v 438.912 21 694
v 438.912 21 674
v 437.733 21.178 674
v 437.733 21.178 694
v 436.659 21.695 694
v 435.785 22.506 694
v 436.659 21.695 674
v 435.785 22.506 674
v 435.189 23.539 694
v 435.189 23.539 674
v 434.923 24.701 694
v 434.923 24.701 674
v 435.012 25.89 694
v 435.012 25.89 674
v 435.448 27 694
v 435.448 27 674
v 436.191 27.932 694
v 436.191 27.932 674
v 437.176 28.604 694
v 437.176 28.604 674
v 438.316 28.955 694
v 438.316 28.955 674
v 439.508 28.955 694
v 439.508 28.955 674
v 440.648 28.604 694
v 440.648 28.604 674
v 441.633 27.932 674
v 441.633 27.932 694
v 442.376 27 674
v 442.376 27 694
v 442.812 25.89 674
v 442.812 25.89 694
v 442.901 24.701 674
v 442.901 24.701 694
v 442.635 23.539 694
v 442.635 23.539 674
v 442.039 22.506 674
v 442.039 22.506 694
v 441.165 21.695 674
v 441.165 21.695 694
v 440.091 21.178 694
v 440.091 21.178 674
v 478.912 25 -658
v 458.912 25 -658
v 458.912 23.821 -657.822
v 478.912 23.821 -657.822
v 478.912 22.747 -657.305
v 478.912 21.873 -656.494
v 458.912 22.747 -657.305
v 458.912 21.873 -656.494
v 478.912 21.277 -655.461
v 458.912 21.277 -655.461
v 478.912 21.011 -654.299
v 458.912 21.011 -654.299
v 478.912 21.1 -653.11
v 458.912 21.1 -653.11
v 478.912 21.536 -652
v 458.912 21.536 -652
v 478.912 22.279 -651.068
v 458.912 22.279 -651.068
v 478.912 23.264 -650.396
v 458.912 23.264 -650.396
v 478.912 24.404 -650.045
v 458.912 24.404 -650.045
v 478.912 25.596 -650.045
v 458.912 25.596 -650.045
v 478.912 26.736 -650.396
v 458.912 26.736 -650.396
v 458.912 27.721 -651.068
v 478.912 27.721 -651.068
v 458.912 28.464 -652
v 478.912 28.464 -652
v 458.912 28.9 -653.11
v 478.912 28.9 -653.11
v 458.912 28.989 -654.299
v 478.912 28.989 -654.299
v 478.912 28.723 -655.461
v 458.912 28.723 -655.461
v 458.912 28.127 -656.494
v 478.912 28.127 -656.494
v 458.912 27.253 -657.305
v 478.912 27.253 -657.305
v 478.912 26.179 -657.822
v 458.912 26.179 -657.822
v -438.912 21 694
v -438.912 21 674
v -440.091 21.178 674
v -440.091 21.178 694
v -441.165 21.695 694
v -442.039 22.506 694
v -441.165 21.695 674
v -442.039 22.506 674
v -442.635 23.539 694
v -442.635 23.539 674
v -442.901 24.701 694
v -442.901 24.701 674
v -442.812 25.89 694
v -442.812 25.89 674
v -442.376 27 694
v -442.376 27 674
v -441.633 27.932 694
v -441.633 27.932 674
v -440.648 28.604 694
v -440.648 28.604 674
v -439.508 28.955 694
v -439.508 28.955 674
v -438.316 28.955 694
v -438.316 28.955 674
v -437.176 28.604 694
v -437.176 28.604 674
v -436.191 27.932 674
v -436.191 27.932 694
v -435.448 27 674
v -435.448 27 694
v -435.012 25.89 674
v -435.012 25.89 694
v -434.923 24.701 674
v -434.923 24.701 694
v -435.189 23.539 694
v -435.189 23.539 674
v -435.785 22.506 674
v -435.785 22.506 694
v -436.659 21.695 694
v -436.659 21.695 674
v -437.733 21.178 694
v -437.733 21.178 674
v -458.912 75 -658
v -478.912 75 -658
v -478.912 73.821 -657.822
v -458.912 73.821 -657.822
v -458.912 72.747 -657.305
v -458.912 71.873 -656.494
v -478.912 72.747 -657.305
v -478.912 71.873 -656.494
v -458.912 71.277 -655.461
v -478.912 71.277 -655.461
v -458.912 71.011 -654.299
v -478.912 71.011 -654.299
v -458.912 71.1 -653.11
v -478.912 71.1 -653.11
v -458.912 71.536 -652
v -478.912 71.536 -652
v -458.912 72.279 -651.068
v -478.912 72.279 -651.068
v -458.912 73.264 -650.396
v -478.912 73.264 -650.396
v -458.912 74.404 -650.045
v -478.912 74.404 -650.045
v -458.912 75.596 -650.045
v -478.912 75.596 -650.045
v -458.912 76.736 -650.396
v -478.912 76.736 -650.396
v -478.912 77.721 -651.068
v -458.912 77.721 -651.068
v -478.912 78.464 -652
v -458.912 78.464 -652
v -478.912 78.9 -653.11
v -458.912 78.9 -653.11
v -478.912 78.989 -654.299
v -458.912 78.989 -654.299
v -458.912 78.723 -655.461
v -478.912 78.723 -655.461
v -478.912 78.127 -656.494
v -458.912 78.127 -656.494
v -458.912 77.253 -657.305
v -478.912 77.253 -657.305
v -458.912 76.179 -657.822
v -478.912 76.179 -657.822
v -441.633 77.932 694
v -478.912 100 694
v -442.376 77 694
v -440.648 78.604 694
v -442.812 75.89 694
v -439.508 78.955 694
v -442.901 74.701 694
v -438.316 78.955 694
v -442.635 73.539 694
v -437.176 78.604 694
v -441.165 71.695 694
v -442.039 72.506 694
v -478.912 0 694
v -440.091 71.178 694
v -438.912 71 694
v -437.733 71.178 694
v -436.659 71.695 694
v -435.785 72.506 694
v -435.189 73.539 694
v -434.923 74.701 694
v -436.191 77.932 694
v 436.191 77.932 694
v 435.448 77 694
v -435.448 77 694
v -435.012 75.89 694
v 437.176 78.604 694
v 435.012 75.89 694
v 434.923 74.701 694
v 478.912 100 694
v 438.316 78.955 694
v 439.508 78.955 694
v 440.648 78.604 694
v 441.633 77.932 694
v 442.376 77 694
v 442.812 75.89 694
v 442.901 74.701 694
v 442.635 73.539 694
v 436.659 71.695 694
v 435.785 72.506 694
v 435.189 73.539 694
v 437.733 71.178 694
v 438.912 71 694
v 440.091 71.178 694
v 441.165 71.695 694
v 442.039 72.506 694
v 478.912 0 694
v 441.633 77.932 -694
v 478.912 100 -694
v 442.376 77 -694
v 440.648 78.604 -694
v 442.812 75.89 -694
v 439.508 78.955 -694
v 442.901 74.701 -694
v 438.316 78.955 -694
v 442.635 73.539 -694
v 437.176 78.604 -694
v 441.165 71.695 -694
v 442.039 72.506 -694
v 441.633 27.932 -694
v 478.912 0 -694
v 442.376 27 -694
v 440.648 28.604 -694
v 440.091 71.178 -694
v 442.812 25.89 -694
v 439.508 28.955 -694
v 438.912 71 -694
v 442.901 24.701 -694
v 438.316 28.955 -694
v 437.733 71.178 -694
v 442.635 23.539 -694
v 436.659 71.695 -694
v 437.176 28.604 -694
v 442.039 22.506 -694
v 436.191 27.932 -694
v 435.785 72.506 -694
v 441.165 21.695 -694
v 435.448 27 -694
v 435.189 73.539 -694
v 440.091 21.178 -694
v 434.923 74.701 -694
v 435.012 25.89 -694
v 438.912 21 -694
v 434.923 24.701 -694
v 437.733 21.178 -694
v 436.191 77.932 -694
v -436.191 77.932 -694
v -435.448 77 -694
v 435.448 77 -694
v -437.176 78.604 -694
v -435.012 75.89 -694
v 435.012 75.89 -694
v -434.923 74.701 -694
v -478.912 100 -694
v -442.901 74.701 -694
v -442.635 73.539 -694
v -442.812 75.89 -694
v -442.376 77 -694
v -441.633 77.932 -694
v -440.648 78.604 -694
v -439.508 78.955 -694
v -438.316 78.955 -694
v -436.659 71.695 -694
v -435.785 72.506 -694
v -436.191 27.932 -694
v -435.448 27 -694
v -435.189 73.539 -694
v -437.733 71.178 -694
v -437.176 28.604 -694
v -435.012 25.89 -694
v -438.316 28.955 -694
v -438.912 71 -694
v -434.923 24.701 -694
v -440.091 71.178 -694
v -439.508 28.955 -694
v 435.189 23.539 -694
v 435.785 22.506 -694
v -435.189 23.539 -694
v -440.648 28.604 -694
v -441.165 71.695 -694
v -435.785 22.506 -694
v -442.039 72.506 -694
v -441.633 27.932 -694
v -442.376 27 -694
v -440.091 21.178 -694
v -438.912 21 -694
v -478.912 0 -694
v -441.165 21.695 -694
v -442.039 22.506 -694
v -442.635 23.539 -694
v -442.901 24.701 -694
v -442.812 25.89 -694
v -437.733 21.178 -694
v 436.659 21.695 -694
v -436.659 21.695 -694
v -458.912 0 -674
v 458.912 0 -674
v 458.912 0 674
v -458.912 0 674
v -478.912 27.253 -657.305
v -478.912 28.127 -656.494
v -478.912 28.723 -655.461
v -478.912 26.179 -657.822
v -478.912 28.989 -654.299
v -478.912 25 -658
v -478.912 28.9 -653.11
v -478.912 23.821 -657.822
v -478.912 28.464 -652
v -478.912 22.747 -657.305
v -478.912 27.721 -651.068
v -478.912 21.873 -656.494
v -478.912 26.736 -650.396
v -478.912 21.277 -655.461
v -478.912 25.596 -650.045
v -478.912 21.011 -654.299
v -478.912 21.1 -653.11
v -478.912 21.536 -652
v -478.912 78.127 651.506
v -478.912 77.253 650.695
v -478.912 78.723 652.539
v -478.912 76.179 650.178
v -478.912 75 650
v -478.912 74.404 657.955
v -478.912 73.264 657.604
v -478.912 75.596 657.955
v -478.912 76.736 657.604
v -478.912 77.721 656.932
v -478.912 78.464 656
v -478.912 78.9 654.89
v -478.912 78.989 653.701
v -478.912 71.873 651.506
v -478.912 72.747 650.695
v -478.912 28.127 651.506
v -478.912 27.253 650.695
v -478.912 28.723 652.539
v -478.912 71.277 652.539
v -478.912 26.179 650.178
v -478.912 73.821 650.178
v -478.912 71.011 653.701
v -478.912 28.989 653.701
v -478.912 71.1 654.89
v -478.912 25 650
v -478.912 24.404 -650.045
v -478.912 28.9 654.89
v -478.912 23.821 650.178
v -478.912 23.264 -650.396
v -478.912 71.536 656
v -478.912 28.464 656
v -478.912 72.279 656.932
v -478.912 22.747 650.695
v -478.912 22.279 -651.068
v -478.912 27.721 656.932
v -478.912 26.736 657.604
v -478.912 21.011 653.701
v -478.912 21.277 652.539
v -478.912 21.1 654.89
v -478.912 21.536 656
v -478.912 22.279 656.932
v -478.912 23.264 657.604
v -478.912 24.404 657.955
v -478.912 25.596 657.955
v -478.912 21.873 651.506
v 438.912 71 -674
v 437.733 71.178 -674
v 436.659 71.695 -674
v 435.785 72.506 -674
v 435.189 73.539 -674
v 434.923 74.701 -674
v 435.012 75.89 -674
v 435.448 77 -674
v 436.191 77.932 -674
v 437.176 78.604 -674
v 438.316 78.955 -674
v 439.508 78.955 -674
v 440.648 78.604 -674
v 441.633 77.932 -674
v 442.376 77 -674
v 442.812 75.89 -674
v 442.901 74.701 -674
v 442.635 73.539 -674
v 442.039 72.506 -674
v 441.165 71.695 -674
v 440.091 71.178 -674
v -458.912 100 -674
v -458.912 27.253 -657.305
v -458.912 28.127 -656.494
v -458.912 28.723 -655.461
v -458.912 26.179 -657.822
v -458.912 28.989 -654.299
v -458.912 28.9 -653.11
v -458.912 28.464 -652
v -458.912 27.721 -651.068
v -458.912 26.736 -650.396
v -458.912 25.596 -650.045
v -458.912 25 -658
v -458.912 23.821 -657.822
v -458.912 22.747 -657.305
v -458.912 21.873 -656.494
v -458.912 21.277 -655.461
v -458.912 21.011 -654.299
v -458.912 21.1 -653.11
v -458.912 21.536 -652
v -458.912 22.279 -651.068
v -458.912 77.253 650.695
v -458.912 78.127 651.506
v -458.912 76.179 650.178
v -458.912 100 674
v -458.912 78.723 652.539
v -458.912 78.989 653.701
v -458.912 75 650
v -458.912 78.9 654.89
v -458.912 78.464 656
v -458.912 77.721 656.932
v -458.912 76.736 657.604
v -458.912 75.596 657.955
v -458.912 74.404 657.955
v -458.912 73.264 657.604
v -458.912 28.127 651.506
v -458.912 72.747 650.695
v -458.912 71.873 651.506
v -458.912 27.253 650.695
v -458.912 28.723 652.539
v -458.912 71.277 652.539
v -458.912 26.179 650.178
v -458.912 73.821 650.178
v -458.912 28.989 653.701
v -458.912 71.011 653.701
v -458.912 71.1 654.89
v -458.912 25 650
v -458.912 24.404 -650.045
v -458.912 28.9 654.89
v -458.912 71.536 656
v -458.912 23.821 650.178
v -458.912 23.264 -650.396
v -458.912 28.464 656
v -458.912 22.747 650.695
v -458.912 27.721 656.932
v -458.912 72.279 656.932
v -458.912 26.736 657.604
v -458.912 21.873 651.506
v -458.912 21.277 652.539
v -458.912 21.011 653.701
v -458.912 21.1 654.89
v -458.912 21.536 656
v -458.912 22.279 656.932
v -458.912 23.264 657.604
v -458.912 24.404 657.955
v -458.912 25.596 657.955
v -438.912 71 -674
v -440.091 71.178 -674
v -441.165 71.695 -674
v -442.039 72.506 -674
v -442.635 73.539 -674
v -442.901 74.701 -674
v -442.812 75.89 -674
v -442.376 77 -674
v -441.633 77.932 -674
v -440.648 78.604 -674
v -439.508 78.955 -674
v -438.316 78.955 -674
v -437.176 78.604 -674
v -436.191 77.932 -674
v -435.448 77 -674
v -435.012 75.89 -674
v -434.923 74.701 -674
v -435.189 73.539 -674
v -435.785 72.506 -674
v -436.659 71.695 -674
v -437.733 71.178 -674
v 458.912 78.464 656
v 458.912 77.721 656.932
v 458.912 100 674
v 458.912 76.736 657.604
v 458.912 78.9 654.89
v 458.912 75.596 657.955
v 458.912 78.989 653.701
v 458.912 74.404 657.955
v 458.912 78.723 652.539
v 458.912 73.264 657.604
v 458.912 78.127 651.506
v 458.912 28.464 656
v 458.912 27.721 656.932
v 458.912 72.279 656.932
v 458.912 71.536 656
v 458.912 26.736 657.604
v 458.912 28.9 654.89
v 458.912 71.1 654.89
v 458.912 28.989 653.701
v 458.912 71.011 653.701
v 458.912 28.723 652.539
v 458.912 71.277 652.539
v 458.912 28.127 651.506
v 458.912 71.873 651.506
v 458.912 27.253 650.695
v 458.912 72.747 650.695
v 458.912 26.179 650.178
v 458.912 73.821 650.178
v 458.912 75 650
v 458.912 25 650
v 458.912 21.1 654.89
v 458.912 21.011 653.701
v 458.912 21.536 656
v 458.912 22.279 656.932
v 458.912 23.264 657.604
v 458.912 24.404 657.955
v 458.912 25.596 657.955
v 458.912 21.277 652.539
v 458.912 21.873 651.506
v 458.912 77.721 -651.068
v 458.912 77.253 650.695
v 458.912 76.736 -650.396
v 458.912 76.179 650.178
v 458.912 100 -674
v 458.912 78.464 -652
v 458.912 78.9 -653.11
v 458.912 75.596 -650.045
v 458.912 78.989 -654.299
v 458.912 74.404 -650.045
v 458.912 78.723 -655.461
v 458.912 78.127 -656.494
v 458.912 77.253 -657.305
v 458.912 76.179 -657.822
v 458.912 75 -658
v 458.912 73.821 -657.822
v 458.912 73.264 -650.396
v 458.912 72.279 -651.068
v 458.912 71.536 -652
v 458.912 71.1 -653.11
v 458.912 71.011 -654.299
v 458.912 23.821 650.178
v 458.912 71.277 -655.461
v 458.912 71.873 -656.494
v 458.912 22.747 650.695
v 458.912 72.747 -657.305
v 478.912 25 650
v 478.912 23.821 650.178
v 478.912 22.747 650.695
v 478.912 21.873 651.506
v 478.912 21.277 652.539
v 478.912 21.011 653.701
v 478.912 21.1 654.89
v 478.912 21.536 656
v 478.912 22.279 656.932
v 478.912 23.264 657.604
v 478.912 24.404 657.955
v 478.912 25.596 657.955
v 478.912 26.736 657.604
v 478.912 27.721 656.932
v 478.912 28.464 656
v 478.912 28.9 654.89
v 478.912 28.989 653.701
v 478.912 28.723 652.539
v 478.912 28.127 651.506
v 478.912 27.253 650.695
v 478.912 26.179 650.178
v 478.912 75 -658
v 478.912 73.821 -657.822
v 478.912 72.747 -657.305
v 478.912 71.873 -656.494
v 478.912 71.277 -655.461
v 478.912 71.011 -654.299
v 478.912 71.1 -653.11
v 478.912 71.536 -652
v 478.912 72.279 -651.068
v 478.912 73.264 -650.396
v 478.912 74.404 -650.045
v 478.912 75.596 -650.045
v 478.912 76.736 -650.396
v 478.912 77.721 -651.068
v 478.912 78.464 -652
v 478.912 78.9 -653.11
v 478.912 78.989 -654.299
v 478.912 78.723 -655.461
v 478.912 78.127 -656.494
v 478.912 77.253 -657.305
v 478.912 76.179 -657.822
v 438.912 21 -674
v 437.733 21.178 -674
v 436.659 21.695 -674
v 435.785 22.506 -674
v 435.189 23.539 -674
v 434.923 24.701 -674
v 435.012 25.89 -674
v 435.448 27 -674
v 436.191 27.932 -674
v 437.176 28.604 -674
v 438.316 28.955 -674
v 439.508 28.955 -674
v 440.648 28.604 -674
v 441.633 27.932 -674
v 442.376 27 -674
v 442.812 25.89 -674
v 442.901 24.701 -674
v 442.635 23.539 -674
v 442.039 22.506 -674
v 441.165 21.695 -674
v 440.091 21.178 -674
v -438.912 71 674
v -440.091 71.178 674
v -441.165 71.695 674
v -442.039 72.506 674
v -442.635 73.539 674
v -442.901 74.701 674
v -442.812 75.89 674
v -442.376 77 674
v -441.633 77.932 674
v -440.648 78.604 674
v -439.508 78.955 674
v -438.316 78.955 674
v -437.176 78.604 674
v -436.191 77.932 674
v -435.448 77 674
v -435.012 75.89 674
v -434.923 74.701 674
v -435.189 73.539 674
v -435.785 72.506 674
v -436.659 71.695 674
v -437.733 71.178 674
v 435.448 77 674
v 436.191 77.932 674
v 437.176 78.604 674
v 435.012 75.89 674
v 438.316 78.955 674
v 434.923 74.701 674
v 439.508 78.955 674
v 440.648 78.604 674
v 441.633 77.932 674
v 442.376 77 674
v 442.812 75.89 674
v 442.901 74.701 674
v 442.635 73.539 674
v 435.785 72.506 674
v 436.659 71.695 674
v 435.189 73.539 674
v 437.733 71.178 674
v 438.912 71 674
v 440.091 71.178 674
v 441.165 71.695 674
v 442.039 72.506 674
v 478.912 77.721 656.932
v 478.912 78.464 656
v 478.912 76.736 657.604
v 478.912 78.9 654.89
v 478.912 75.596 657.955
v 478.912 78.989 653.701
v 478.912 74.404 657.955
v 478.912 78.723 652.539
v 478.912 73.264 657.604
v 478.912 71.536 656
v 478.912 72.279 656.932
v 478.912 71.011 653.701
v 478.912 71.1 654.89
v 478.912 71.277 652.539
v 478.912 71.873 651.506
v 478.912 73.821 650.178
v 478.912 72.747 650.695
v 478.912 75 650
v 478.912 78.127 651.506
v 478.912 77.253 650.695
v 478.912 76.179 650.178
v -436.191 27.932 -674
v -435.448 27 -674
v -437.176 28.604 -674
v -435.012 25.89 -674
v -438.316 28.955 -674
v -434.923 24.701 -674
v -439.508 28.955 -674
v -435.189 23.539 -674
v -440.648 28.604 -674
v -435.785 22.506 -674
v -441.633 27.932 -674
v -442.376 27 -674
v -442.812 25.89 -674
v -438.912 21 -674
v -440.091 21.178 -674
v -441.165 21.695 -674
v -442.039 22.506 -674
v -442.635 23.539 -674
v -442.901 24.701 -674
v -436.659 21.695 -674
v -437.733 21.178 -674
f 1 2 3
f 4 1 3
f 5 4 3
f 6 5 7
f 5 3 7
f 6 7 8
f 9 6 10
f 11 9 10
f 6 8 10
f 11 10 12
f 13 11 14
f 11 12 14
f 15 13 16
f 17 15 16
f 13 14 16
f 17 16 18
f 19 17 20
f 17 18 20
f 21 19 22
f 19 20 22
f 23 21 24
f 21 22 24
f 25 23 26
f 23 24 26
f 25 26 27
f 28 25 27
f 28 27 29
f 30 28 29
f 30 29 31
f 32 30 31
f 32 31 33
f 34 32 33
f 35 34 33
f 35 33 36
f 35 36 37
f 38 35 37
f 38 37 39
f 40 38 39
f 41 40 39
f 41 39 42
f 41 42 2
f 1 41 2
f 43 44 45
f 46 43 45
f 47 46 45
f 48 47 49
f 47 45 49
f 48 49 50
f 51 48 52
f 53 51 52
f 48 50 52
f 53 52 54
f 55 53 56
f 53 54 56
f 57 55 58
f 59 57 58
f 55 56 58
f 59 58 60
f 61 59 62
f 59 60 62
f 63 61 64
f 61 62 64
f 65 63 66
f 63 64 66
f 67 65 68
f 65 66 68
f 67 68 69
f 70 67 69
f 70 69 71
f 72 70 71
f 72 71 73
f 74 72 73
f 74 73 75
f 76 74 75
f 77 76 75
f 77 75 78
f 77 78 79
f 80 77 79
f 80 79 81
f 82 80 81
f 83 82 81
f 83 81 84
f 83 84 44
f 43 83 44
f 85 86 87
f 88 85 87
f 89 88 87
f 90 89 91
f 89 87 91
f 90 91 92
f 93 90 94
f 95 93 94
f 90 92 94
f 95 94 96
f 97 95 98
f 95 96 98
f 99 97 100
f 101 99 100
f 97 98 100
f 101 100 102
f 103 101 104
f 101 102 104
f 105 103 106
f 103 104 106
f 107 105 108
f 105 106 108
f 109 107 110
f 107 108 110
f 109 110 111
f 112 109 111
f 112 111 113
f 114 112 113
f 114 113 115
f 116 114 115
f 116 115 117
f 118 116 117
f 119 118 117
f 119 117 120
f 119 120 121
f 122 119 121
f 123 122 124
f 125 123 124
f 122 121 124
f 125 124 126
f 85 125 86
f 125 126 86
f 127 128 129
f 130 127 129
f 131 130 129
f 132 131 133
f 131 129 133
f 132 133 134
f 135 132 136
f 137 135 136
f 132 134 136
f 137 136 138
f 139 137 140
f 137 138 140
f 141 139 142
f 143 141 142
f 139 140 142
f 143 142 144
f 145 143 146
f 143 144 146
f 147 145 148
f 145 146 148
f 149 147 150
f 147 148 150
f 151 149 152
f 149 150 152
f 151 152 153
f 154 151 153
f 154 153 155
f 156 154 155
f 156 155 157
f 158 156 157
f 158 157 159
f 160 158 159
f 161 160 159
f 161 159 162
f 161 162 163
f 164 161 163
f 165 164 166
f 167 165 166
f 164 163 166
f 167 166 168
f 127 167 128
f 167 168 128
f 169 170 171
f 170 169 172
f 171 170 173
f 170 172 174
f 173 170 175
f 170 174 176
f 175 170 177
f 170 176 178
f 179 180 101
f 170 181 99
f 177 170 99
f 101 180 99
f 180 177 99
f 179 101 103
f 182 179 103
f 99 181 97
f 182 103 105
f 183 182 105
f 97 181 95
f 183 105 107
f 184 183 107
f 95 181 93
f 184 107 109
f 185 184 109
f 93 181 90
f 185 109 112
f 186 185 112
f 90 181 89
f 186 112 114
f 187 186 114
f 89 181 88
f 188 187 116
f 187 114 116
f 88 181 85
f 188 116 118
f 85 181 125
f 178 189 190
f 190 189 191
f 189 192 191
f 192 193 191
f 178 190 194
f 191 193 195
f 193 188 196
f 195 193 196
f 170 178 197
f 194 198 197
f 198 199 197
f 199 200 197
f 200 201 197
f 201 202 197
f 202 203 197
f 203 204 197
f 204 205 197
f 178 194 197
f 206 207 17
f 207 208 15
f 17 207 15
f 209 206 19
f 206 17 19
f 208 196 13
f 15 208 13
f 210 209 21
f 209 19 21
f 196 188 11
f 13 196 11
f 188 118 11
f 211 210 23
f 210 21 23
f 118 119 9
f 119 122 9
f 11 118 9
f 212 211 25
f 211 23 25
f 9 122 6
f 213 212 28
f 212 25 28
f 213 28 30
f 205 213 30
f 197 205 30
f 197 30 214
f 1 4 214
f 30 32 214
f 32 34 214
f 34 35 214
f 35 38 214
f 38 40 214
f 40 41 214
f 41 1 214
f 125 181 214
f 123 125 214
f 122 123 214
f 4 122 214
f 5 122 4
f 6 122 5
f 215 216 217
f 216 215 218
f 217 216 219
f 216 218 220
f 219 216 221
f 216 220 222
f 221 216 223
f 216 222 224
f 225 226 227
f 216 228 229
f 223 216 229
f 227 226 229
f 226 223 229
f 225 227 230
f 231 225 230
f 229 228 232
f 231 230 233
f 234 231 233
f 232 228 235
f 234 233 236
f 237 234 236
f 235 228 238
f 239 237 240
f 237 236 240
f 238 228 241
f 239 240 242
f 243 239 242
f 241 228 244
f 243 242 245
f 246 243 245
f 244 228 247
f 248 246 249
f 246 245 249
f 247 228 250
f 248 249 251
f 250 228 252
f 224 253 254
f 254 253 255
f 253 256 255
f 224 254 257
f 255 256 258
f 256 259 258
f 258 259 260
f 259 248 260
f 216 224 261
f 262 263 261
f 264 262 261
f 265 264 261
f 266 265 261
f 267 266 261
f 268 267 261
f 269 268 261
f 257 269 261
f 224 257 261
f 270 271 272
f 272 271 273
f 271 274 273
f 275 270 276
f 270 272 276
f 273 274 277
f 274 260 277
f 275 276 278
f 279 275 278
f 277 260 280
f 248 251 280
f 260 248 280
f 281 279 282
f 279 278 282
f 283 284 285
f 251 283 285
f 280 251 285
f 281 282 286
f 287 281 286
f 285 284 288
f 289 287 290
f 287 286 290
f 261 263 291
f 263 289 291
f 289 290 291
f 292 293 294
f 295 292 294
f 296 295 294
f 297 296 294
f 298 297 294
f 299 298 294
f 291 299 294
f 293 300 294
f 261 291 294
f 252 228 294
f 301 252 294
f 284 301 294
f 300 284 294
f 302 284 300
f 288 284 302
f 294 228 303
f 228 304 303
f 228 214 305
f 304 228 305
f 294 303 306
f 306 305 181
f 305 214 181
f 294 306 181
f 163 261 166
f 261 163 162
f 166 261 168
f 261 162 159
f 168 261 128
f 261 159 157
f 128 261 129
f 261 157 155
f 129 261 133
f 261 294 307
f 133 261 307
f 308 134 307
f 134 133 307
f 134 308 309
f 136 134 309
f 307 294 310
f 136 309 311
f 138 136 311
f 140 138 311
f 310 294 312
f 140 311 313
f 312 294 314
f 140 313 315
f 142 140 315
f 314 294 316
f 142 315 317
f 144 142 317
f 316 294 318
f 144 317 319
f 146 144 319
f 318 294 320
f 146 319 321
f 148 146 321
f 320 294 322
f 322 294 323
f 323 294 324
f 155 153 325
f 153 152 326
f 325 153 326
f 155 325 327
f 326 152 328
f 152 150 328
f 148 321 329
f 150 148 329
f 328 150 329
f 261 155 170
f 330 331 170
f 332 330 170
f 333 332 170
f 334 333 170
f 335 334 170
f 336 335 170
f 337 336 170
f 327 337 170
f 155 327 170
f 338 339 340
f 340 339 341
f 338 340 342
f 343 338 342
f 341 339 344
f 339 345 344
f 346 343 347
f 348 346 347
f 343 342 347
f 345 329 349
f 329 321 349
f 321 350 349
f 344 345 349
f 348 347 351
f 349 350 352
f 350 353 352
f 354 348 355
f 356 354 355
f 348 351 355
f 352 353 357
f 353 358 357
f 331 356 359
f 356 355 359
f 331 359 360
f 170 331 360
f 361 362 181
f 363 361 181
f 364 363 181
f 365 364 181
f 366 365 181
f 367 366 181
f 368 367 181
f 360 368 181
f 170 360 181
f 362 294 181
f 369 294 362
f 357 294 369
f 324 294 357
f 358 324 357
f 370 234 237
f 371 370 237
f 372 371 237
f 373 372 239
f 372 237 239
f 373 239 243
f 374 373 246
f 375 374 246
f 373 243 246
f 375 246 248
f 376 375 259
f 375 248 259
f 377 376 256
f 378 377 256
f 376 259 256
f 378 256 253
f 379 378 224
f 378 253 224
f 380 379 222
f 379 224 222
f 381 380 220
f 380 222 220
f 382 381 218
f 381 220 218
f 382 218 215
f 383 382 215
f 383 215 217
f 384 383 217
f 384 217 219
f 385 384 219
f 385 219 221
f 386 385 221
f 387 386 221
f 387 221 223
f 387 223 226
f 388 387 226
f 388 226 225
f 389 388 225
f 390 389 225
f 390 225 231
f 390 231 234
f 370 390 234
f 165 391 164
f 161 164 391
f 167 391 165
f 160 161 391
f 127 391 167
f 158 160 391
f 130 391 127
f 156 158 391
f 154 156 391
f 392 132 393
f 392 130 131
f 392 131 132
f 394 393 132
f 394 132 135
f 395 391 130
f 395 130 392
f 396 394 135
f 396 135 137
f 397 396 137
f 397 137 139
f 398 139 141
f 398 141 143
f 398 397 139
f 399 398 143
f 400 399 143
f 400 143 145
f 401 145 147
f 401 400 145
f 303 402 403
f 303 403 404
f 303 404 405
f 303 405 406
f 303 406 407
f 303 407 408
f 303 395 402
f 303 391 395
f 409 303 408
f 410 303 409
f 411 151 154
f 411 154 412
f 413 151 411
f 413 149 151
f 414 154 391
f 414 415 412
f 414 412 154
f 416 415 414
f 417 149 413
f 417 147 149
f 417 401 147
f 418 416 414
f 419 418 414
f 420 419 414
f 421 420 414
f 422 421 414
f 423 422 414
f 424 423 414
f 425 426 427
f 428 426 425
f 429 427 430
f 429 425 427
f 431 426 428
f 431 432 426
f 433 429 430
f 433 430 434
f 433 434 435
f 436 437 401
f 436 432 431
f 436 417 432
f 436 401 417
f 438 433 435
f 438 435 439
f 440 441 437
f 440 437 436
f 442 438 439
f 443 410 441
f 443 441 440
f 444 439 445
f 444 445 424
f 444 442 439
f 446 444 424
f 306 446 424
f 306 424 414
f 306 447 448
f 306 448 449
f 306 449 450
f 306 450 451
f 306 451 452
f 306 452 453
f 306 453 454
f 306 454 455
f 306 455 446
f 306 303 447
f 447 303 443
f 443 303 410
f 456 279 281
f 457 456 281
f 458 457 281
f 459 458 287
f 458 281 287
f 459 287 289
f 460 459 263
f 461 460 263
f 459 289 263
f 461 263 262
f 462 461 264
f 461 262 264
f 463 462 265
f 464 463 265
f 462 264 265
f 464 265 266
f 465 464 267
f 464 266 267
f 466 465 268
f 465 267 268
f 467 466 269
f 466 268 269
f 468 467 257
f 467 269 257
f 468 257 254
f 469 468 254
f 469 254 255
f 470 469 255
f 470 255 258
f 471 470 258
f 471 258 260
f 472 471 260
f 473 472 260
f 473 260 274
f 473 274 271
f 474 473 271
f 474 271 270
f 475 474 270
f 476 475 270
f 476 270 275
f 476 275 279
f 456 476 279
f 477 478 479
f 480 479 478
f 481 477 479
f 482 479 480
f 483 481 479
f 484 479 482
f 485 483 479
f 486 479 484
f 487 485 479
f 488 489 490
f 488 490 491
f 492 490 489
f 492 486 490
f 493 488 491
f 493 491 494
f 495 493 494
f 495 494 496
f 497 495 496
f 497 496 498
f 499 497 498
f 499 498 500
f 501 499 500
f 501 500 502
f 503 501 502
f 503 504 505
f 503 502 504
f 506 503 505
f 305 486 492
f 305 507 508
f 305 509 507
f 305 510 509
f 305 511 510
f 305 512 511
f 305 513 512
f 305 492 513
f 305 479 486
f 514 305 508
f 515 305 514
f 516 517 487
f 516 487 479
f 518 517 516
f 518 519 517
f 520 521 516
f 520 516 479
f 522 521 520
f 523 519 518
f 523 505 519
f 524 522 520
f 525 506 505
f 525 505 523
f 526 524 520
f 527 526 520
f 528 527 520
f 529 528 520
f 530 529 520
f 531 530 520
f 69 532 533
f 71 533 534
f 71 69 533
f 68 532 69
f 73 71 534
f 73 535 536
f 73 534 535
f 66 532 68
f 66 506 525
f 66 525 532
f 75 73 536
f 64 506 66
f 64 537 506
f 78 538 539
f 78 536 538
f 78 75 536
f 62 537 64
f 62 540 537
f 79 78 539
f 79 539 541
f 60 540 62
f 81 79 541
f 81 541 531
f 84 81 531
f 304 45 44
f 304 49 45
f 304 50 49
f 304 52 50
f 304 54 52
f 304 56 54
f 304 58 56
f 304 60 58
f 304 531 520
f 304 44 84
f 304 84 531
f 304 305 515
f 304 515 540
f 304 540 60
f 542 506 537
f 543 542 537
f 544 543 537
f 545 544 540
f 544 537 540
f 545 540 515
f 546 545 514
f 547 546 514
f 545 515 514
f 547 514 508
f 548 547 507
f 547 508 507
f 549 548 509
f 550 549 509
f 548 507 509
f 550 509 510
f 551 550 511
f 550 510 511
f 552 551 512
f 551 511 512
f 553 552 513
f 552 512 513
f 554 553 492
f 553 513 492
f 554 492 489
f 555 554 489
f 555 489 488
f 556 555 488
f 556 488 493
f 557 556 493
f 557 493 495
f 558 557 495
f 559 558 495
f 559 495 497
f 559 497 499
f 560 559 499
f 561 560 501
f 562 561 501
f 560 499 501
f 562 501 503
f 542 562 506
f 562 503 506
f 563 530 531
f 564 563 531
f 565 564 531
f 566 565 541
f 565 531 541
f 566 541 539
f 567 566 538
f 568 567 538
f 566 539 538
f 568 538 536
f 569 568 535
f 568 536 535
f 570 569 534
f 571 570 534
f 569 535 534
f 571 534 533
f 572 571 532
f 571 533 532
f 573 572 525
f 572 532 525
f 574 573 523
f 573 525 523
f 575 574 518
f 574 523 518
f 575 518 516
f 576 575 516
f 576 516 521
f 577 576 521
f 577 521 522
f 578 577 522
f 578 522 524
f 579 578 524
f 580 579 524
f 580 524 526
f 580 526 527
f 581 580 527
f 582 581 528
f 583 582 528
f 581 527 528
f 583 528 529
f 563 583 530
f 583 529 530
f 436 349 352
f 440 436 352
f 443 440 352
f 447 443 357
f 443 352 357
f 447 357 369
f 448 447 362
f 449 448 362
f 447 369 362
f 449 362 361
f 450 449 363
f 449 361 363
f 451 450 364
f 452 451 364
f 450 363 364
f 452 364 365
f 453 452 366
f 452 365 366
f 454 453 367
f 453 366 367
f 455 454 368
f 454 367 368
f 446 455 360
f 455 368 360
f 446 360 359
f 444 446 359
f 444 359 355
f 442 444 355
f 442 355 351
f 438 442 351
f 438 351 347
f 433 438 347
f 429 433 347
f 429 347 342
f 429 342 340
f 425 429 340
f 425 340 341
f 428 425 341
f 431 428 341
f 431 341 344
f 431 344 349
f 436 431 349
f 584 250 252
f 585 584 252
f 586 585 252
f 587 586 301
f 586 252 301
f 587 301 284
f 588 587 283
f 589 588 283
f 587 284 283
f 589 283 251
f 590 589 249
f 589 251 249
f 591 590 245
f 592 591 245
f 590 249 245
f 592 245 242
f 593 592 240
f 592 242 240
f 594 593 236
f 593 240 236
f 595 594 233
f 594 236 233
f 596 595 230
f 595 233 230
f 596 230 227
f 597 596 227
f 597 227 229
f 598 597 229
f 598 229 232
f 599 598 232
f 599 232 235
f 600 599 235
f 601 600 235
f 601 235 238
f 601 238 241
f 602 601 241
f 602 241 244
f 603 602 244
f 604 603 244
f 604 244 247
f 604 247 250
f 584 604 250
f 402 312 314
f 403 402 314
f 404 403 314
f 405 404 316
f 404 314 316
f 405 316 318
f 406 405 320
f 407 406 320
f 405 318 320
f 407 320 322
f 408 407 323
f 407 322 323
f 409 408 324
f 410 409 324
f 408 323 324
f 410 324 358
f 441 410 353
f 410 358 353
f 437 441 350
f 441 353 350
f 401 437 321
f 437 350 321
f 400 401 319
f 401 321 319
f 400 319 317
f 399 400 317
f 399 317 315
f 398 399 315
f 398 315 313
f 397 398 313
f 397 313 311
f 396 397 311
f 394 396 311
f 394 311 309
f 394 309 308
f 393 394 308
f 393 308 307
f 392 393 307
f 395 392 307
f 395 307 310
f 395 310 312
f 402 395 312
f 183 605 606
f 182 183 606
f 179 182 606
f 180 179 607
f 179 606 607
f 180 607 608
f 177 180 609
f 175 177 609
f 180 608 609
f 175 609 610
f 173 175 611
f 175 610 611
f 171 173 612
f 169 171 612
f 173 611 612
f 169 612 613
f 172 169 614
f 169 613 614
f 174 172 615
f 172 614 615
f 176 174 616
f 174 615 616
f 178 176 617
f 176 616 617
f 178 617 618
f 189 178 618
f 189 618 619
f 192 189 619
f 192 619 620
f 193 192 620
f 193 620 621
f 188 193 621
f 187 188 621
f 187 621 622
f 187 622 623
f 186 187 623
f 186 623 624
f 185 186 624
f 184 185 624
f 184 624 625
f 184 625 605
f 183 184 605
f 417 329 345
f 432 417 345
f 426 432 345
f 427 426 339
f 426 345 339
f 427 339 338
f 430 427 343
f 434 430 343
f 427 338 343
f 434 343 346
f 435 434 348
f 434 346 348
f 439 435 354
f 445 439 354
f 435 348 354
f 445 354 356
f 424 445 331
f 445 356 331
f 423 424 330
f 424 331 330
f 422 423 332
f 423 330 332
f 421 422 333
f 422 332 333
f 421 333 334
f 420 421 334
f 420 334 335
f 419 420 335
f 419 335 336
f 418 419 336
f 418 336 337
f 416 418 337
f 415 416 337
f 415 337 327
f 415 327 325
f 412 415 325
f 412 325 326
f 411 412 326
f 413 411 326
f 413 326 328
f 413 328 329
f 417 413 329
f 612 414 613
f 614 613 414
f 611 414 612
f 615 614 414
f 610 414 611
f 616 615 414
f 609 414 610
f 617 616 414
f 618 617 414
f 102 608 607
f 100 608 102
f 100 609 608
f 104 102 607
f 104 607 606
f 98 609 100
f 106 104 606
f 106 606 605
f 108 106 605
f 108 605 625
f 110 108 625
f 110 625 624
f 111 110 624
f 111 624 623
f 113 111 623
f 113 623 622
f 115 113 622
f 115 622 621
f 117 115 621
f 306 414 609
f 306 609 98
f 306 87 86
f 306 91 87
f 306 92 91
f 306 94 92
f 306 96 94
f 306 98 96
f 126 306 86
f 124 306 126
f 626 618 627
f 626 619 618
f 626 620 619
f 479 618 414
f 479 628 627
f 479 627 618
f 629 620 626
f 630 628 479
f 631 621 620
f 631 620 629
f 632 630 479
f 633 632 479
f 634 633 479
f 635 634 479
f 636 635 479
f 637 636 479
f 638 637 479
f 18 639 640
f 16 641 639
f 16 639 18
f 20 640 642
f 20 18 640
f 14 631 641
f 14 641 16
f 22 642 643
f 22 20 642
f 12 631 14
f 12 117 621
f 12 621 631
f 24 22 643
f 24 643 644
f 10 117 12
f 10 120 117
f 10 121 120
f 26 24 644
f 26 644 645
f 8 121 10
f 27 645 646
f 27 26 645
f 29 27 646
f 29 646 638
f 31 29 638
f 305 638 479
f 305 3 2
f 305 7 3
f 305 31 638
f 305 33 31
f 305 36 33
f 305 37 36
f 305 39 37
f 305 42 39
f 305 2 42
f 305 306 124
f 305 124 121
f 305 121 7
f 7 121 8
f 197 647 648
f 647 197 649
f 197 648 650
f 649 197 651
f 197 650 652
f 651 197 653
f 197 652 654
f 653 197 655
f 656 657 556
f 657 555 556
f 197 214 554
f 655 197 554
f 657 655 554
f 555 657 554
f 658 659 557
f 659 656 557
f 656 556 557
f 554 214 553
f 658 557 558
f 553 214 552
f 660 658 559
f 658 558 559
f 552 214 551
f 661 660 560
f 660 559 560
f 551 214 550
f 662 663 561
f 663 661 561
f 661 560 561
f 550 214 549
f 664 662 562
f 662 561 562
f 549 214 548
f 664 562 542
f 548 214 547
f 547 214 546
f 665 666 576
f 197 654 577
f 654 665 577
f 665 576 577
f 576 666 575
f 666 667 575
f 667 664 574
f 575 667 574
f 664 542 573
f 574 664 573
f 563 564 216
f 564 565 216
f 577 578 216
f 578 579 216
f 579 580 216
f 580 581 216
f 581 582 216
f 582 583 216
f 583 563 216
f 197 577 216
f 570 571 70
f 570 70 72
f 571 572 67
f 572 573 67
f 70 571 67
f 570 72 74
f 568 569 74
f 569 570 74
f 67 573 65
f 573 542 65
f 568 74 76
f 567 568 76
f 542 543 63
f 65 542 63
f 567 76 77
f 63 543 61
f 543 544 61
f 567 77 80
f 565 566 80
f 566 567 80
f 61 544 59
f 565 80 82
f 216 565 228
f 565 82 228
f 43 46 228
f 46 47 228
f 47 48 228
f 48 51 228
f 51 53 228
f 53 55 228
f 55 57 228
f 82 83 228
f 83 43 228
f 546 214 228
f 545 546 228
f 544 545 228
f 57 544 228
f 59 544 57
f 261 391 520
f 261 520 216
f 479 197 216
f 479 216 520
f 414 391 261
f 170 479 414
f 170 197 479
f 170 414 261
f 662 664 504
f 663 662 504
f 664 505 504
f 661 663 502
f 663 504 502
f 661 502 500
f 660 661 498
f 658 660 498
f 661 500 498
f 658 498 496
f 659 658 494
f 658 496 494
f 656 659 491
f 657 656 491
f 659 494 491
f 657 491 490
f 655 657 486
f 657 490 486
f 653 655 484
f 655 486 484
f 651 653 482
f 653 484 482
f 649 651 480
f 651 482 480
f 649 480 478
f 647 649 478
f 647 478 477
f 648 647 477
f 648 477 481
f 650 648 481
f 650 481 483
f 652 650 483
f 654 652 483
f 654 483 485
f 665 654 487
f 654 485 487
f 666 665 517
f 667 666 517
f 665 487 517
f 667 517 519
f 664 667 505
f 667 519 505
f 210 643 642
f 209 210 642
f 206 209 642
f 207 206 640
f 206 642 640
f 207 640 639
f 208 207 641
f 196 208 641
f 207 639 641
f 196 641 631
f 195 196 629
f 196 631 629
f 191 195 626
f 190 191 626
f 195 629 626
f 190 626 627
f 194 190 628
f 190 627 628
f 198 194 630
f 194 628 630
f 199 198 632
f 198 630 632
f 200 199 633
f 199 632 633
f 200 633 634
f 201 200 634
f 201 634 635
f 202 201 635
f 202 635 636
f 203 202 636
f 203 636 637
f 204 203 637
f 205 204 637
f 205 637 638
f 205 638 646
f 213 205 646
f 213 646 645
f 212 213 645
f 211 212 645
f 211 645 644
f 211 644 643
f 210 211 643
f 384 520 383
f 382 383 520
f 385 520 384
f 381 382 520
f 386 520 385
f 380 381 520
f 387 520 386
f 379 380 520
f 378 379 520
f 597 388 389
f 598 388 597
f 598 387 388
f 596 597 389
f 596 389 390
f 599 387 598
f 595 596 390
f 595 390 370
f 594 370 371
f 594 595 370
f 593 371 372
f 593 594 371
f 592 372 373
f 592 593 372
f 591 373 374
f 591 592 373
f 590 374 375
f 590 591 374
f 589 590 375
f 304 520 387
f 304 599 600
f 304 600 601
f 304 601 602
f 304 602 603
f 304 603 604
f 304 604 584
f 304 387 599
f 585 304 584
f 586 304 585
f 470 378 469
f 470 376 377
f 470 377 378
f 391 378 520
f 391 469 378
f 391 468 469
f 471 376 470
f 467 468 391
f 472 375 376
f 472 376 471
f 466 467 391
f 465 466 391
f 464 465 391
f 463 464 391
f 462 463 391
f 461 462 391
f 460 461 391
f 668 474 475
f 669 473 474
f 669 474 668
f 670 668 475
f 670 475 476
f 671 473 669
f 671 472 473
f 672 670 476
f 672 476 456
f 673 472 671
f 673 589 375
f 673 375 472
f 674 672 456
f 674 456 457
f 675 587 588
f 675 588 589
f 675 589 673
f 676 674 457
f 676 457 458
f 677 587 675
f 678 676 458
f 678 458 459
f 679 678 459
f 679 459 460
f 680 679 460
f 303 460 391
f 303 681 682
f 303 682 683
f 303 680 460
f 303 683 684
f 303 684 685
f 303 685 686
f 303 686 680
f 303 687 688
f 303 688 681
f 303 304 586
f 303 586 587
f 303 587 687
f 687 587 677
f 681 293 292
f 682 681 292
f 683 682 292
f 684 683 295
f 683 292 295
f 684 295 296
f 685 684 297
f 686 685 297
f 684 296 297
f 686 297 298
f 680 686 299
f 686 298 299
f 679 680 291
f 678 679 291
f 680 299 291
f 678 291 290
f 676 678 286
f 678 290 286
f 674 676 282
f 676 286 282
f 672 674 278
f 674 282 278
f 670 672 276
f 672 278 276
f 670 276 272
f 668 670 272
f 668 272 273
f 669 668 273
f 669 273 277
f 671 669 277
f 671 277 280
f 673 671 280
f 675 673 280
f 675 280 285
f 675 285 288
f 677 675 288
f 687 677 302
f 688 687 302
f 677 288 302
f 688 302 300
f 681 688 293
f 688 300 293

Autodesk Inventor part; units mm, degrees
ref_plane "YZ Plane" through (0, 0, 0) normal (1, 0, 0) x (0, 1, 0)
ref_plane "XZ Plane" through (0, 0, 0) normal (0, 1, 0) x (-1, 0, 0)
ref_plane "XY Plane" through (0, 0, 0) normal (0, 0, 1) x (1, 0, 0)
sketch "Sketch1" plane through (0, 0, 0) normal (0, 1, 0) x (-1, 0, 0)
  line L0 (478.912, 694) -> (-478.912, 694)
  line L1 (-478.912, 694) -> (-478.912, -694)
  line L2 (-478.912, -694) -> (478.912, -694)
  line L3 (478.912, -694) -> (478.912, 694)
  line L4 (478.912, 694) -> (-478.912, -694) construction
  line L5 (-478.912, 694) -> (478.912, -694) construction
  line L6 (458.912, 674) -> (-458.912, 674)
  line L7 (-458.912, 674) -> (-458.912, -674)
  line L8 (-458.912, -674) -> (458.912, -674)
  line L9 (458.912, -674) -> (458.912, 674)
  line L10 (458.912, 674) -> (-458.912, -674) construction
  line L11 (-458.912, 674) -> (458.912, -674) construction
  point P0 (0, 0)
  point P1 (458.912, 0)
  point P2 (-448.912, 0)
  point P3 (-458.912, 0)
  point P4 (0, 674)
  point P5 (0, -674)
  dimension "d0" = 957.824
  dimension "d1" = 1388
  dimension "d2" = 917.824
  dimension "d3" = 1348
extrude "Extrusion7" add sketch "Sketch1" along normal blind 100
sketch "Sketch2" plane through (478.912, 0, 694) normal (1, 0, 0) x (0, 0, -1)
  line L0 (0, 0) -> (0, 100) projected
  line L1 (0, 100) -> (1388, 100) projected
  point P0 (694, 0)
  point P1 (40, 75)
  dimension "d40" = 40
  dimension "d41" = 25
hole "Hole1" at (478.912, 75, 654) direction (-1, 0, 0) diameter 8 end through all
sketch "Sketch3" plane through (478.912, 0, 694) normal (1, 0, 0) x (0, 0, -1)
  line L0 (0, 0) -> (0, 100) projected
  line L1 (0, 0) -> (1388, 0) projected
  point P0 (694, 0)
  point P1 (40, 25)
  dimension "d42" = 40
  dimension "d43" = 25
hole "Hole2" at (478.912, 25, 654) direction (-1, 0, 0) diameter 8 end through all
sketch "Sketch4" plane through (478.912, 0, 694) normal (1, 0, 0) x (0, 0, -1)
  line L0 (1388, 0) -> (1388, 100) projected
  line L1 (0, 100) -> (1388, 100) projected
  point P0 (694, 0)
  point P1 (1348, 75)
  dimension "d58" = 40
  dimension "d59" = 25
hole "Hole3" at (478.912, 75, -654) direction (-1, 0, 0) diameter 8 end through all
sketch "Sketch5" plane through (478.912, 0, 694) normal (1, 0, 0) x (0, 0, -1)
  line L0 (1388, 0) -> (1388, 100) projected
  line L1 (0, 0) -> (1388, 0) projected
  point P0 (694, 0)
  point P1 (1348, 25)
  dimension "d60" = 40
  dimension "d61" = 25
hole "Hole4" at (478.912, 25, -654) direction (-1, 0, 0) diameter 8 end through all
sketch "Sketch6" plane through (-478.912, 0, 694) normal (0, 0, 1) x (1, 0, 0)
  line L0 (0, 100) -> (957.824, 100) projected
  line L1 (957.824, 0) -> (957.824, 100) projected
  line L2 (0, 0) -> (957.824, 0) projected
  point P0 (478.912, 0)
  point P1 (917.824, 75)
  point P2 (917.824, 25)
  dimension "d69" = 25
  dimension "d70" = 40
  dimension "d71" = 40
  dimension "d72" = 25
hole "Hole5" at (438.912, 75, 694) at (438.912, 25, 694) direction (0, 0, -1) diameter 8 end through all
sketch "Sketch7" plane through (-478.912, 0, 694) normal (0, 0, 1) x (1, 0, 0)
  line L0 (0, 0) -> (0, 100) projected
  line L1 (0, 100) -> (957.824, 100) projected
  point P0 (478.912, 0)
  point P1 (40, 75)
  dimension "d87" = 40
  dimension "d88" = 25
hole "Hole6" at (-438.912, 75, 694) direction (0, 0, -1) diameter 8 end through all
sketch "Sketch8" plane through (-478.912, 0, 694) normal (0, 0, 1) x (1, 0, 0)
  line L0 (0, 0) -> (0, 100) projected
  line L1 (0, 0) -> (957.824, 0) projected
  point P0 (478.912, 0)
  point P1 (40, 25)
  dimension "d89" = 40
  dimension "d90" = 25
hole "Hole7" at (-438.912, 25, 694) direction (0, 0, -1) diameter 8 end through all
properties part number "solar panels holder 2"
